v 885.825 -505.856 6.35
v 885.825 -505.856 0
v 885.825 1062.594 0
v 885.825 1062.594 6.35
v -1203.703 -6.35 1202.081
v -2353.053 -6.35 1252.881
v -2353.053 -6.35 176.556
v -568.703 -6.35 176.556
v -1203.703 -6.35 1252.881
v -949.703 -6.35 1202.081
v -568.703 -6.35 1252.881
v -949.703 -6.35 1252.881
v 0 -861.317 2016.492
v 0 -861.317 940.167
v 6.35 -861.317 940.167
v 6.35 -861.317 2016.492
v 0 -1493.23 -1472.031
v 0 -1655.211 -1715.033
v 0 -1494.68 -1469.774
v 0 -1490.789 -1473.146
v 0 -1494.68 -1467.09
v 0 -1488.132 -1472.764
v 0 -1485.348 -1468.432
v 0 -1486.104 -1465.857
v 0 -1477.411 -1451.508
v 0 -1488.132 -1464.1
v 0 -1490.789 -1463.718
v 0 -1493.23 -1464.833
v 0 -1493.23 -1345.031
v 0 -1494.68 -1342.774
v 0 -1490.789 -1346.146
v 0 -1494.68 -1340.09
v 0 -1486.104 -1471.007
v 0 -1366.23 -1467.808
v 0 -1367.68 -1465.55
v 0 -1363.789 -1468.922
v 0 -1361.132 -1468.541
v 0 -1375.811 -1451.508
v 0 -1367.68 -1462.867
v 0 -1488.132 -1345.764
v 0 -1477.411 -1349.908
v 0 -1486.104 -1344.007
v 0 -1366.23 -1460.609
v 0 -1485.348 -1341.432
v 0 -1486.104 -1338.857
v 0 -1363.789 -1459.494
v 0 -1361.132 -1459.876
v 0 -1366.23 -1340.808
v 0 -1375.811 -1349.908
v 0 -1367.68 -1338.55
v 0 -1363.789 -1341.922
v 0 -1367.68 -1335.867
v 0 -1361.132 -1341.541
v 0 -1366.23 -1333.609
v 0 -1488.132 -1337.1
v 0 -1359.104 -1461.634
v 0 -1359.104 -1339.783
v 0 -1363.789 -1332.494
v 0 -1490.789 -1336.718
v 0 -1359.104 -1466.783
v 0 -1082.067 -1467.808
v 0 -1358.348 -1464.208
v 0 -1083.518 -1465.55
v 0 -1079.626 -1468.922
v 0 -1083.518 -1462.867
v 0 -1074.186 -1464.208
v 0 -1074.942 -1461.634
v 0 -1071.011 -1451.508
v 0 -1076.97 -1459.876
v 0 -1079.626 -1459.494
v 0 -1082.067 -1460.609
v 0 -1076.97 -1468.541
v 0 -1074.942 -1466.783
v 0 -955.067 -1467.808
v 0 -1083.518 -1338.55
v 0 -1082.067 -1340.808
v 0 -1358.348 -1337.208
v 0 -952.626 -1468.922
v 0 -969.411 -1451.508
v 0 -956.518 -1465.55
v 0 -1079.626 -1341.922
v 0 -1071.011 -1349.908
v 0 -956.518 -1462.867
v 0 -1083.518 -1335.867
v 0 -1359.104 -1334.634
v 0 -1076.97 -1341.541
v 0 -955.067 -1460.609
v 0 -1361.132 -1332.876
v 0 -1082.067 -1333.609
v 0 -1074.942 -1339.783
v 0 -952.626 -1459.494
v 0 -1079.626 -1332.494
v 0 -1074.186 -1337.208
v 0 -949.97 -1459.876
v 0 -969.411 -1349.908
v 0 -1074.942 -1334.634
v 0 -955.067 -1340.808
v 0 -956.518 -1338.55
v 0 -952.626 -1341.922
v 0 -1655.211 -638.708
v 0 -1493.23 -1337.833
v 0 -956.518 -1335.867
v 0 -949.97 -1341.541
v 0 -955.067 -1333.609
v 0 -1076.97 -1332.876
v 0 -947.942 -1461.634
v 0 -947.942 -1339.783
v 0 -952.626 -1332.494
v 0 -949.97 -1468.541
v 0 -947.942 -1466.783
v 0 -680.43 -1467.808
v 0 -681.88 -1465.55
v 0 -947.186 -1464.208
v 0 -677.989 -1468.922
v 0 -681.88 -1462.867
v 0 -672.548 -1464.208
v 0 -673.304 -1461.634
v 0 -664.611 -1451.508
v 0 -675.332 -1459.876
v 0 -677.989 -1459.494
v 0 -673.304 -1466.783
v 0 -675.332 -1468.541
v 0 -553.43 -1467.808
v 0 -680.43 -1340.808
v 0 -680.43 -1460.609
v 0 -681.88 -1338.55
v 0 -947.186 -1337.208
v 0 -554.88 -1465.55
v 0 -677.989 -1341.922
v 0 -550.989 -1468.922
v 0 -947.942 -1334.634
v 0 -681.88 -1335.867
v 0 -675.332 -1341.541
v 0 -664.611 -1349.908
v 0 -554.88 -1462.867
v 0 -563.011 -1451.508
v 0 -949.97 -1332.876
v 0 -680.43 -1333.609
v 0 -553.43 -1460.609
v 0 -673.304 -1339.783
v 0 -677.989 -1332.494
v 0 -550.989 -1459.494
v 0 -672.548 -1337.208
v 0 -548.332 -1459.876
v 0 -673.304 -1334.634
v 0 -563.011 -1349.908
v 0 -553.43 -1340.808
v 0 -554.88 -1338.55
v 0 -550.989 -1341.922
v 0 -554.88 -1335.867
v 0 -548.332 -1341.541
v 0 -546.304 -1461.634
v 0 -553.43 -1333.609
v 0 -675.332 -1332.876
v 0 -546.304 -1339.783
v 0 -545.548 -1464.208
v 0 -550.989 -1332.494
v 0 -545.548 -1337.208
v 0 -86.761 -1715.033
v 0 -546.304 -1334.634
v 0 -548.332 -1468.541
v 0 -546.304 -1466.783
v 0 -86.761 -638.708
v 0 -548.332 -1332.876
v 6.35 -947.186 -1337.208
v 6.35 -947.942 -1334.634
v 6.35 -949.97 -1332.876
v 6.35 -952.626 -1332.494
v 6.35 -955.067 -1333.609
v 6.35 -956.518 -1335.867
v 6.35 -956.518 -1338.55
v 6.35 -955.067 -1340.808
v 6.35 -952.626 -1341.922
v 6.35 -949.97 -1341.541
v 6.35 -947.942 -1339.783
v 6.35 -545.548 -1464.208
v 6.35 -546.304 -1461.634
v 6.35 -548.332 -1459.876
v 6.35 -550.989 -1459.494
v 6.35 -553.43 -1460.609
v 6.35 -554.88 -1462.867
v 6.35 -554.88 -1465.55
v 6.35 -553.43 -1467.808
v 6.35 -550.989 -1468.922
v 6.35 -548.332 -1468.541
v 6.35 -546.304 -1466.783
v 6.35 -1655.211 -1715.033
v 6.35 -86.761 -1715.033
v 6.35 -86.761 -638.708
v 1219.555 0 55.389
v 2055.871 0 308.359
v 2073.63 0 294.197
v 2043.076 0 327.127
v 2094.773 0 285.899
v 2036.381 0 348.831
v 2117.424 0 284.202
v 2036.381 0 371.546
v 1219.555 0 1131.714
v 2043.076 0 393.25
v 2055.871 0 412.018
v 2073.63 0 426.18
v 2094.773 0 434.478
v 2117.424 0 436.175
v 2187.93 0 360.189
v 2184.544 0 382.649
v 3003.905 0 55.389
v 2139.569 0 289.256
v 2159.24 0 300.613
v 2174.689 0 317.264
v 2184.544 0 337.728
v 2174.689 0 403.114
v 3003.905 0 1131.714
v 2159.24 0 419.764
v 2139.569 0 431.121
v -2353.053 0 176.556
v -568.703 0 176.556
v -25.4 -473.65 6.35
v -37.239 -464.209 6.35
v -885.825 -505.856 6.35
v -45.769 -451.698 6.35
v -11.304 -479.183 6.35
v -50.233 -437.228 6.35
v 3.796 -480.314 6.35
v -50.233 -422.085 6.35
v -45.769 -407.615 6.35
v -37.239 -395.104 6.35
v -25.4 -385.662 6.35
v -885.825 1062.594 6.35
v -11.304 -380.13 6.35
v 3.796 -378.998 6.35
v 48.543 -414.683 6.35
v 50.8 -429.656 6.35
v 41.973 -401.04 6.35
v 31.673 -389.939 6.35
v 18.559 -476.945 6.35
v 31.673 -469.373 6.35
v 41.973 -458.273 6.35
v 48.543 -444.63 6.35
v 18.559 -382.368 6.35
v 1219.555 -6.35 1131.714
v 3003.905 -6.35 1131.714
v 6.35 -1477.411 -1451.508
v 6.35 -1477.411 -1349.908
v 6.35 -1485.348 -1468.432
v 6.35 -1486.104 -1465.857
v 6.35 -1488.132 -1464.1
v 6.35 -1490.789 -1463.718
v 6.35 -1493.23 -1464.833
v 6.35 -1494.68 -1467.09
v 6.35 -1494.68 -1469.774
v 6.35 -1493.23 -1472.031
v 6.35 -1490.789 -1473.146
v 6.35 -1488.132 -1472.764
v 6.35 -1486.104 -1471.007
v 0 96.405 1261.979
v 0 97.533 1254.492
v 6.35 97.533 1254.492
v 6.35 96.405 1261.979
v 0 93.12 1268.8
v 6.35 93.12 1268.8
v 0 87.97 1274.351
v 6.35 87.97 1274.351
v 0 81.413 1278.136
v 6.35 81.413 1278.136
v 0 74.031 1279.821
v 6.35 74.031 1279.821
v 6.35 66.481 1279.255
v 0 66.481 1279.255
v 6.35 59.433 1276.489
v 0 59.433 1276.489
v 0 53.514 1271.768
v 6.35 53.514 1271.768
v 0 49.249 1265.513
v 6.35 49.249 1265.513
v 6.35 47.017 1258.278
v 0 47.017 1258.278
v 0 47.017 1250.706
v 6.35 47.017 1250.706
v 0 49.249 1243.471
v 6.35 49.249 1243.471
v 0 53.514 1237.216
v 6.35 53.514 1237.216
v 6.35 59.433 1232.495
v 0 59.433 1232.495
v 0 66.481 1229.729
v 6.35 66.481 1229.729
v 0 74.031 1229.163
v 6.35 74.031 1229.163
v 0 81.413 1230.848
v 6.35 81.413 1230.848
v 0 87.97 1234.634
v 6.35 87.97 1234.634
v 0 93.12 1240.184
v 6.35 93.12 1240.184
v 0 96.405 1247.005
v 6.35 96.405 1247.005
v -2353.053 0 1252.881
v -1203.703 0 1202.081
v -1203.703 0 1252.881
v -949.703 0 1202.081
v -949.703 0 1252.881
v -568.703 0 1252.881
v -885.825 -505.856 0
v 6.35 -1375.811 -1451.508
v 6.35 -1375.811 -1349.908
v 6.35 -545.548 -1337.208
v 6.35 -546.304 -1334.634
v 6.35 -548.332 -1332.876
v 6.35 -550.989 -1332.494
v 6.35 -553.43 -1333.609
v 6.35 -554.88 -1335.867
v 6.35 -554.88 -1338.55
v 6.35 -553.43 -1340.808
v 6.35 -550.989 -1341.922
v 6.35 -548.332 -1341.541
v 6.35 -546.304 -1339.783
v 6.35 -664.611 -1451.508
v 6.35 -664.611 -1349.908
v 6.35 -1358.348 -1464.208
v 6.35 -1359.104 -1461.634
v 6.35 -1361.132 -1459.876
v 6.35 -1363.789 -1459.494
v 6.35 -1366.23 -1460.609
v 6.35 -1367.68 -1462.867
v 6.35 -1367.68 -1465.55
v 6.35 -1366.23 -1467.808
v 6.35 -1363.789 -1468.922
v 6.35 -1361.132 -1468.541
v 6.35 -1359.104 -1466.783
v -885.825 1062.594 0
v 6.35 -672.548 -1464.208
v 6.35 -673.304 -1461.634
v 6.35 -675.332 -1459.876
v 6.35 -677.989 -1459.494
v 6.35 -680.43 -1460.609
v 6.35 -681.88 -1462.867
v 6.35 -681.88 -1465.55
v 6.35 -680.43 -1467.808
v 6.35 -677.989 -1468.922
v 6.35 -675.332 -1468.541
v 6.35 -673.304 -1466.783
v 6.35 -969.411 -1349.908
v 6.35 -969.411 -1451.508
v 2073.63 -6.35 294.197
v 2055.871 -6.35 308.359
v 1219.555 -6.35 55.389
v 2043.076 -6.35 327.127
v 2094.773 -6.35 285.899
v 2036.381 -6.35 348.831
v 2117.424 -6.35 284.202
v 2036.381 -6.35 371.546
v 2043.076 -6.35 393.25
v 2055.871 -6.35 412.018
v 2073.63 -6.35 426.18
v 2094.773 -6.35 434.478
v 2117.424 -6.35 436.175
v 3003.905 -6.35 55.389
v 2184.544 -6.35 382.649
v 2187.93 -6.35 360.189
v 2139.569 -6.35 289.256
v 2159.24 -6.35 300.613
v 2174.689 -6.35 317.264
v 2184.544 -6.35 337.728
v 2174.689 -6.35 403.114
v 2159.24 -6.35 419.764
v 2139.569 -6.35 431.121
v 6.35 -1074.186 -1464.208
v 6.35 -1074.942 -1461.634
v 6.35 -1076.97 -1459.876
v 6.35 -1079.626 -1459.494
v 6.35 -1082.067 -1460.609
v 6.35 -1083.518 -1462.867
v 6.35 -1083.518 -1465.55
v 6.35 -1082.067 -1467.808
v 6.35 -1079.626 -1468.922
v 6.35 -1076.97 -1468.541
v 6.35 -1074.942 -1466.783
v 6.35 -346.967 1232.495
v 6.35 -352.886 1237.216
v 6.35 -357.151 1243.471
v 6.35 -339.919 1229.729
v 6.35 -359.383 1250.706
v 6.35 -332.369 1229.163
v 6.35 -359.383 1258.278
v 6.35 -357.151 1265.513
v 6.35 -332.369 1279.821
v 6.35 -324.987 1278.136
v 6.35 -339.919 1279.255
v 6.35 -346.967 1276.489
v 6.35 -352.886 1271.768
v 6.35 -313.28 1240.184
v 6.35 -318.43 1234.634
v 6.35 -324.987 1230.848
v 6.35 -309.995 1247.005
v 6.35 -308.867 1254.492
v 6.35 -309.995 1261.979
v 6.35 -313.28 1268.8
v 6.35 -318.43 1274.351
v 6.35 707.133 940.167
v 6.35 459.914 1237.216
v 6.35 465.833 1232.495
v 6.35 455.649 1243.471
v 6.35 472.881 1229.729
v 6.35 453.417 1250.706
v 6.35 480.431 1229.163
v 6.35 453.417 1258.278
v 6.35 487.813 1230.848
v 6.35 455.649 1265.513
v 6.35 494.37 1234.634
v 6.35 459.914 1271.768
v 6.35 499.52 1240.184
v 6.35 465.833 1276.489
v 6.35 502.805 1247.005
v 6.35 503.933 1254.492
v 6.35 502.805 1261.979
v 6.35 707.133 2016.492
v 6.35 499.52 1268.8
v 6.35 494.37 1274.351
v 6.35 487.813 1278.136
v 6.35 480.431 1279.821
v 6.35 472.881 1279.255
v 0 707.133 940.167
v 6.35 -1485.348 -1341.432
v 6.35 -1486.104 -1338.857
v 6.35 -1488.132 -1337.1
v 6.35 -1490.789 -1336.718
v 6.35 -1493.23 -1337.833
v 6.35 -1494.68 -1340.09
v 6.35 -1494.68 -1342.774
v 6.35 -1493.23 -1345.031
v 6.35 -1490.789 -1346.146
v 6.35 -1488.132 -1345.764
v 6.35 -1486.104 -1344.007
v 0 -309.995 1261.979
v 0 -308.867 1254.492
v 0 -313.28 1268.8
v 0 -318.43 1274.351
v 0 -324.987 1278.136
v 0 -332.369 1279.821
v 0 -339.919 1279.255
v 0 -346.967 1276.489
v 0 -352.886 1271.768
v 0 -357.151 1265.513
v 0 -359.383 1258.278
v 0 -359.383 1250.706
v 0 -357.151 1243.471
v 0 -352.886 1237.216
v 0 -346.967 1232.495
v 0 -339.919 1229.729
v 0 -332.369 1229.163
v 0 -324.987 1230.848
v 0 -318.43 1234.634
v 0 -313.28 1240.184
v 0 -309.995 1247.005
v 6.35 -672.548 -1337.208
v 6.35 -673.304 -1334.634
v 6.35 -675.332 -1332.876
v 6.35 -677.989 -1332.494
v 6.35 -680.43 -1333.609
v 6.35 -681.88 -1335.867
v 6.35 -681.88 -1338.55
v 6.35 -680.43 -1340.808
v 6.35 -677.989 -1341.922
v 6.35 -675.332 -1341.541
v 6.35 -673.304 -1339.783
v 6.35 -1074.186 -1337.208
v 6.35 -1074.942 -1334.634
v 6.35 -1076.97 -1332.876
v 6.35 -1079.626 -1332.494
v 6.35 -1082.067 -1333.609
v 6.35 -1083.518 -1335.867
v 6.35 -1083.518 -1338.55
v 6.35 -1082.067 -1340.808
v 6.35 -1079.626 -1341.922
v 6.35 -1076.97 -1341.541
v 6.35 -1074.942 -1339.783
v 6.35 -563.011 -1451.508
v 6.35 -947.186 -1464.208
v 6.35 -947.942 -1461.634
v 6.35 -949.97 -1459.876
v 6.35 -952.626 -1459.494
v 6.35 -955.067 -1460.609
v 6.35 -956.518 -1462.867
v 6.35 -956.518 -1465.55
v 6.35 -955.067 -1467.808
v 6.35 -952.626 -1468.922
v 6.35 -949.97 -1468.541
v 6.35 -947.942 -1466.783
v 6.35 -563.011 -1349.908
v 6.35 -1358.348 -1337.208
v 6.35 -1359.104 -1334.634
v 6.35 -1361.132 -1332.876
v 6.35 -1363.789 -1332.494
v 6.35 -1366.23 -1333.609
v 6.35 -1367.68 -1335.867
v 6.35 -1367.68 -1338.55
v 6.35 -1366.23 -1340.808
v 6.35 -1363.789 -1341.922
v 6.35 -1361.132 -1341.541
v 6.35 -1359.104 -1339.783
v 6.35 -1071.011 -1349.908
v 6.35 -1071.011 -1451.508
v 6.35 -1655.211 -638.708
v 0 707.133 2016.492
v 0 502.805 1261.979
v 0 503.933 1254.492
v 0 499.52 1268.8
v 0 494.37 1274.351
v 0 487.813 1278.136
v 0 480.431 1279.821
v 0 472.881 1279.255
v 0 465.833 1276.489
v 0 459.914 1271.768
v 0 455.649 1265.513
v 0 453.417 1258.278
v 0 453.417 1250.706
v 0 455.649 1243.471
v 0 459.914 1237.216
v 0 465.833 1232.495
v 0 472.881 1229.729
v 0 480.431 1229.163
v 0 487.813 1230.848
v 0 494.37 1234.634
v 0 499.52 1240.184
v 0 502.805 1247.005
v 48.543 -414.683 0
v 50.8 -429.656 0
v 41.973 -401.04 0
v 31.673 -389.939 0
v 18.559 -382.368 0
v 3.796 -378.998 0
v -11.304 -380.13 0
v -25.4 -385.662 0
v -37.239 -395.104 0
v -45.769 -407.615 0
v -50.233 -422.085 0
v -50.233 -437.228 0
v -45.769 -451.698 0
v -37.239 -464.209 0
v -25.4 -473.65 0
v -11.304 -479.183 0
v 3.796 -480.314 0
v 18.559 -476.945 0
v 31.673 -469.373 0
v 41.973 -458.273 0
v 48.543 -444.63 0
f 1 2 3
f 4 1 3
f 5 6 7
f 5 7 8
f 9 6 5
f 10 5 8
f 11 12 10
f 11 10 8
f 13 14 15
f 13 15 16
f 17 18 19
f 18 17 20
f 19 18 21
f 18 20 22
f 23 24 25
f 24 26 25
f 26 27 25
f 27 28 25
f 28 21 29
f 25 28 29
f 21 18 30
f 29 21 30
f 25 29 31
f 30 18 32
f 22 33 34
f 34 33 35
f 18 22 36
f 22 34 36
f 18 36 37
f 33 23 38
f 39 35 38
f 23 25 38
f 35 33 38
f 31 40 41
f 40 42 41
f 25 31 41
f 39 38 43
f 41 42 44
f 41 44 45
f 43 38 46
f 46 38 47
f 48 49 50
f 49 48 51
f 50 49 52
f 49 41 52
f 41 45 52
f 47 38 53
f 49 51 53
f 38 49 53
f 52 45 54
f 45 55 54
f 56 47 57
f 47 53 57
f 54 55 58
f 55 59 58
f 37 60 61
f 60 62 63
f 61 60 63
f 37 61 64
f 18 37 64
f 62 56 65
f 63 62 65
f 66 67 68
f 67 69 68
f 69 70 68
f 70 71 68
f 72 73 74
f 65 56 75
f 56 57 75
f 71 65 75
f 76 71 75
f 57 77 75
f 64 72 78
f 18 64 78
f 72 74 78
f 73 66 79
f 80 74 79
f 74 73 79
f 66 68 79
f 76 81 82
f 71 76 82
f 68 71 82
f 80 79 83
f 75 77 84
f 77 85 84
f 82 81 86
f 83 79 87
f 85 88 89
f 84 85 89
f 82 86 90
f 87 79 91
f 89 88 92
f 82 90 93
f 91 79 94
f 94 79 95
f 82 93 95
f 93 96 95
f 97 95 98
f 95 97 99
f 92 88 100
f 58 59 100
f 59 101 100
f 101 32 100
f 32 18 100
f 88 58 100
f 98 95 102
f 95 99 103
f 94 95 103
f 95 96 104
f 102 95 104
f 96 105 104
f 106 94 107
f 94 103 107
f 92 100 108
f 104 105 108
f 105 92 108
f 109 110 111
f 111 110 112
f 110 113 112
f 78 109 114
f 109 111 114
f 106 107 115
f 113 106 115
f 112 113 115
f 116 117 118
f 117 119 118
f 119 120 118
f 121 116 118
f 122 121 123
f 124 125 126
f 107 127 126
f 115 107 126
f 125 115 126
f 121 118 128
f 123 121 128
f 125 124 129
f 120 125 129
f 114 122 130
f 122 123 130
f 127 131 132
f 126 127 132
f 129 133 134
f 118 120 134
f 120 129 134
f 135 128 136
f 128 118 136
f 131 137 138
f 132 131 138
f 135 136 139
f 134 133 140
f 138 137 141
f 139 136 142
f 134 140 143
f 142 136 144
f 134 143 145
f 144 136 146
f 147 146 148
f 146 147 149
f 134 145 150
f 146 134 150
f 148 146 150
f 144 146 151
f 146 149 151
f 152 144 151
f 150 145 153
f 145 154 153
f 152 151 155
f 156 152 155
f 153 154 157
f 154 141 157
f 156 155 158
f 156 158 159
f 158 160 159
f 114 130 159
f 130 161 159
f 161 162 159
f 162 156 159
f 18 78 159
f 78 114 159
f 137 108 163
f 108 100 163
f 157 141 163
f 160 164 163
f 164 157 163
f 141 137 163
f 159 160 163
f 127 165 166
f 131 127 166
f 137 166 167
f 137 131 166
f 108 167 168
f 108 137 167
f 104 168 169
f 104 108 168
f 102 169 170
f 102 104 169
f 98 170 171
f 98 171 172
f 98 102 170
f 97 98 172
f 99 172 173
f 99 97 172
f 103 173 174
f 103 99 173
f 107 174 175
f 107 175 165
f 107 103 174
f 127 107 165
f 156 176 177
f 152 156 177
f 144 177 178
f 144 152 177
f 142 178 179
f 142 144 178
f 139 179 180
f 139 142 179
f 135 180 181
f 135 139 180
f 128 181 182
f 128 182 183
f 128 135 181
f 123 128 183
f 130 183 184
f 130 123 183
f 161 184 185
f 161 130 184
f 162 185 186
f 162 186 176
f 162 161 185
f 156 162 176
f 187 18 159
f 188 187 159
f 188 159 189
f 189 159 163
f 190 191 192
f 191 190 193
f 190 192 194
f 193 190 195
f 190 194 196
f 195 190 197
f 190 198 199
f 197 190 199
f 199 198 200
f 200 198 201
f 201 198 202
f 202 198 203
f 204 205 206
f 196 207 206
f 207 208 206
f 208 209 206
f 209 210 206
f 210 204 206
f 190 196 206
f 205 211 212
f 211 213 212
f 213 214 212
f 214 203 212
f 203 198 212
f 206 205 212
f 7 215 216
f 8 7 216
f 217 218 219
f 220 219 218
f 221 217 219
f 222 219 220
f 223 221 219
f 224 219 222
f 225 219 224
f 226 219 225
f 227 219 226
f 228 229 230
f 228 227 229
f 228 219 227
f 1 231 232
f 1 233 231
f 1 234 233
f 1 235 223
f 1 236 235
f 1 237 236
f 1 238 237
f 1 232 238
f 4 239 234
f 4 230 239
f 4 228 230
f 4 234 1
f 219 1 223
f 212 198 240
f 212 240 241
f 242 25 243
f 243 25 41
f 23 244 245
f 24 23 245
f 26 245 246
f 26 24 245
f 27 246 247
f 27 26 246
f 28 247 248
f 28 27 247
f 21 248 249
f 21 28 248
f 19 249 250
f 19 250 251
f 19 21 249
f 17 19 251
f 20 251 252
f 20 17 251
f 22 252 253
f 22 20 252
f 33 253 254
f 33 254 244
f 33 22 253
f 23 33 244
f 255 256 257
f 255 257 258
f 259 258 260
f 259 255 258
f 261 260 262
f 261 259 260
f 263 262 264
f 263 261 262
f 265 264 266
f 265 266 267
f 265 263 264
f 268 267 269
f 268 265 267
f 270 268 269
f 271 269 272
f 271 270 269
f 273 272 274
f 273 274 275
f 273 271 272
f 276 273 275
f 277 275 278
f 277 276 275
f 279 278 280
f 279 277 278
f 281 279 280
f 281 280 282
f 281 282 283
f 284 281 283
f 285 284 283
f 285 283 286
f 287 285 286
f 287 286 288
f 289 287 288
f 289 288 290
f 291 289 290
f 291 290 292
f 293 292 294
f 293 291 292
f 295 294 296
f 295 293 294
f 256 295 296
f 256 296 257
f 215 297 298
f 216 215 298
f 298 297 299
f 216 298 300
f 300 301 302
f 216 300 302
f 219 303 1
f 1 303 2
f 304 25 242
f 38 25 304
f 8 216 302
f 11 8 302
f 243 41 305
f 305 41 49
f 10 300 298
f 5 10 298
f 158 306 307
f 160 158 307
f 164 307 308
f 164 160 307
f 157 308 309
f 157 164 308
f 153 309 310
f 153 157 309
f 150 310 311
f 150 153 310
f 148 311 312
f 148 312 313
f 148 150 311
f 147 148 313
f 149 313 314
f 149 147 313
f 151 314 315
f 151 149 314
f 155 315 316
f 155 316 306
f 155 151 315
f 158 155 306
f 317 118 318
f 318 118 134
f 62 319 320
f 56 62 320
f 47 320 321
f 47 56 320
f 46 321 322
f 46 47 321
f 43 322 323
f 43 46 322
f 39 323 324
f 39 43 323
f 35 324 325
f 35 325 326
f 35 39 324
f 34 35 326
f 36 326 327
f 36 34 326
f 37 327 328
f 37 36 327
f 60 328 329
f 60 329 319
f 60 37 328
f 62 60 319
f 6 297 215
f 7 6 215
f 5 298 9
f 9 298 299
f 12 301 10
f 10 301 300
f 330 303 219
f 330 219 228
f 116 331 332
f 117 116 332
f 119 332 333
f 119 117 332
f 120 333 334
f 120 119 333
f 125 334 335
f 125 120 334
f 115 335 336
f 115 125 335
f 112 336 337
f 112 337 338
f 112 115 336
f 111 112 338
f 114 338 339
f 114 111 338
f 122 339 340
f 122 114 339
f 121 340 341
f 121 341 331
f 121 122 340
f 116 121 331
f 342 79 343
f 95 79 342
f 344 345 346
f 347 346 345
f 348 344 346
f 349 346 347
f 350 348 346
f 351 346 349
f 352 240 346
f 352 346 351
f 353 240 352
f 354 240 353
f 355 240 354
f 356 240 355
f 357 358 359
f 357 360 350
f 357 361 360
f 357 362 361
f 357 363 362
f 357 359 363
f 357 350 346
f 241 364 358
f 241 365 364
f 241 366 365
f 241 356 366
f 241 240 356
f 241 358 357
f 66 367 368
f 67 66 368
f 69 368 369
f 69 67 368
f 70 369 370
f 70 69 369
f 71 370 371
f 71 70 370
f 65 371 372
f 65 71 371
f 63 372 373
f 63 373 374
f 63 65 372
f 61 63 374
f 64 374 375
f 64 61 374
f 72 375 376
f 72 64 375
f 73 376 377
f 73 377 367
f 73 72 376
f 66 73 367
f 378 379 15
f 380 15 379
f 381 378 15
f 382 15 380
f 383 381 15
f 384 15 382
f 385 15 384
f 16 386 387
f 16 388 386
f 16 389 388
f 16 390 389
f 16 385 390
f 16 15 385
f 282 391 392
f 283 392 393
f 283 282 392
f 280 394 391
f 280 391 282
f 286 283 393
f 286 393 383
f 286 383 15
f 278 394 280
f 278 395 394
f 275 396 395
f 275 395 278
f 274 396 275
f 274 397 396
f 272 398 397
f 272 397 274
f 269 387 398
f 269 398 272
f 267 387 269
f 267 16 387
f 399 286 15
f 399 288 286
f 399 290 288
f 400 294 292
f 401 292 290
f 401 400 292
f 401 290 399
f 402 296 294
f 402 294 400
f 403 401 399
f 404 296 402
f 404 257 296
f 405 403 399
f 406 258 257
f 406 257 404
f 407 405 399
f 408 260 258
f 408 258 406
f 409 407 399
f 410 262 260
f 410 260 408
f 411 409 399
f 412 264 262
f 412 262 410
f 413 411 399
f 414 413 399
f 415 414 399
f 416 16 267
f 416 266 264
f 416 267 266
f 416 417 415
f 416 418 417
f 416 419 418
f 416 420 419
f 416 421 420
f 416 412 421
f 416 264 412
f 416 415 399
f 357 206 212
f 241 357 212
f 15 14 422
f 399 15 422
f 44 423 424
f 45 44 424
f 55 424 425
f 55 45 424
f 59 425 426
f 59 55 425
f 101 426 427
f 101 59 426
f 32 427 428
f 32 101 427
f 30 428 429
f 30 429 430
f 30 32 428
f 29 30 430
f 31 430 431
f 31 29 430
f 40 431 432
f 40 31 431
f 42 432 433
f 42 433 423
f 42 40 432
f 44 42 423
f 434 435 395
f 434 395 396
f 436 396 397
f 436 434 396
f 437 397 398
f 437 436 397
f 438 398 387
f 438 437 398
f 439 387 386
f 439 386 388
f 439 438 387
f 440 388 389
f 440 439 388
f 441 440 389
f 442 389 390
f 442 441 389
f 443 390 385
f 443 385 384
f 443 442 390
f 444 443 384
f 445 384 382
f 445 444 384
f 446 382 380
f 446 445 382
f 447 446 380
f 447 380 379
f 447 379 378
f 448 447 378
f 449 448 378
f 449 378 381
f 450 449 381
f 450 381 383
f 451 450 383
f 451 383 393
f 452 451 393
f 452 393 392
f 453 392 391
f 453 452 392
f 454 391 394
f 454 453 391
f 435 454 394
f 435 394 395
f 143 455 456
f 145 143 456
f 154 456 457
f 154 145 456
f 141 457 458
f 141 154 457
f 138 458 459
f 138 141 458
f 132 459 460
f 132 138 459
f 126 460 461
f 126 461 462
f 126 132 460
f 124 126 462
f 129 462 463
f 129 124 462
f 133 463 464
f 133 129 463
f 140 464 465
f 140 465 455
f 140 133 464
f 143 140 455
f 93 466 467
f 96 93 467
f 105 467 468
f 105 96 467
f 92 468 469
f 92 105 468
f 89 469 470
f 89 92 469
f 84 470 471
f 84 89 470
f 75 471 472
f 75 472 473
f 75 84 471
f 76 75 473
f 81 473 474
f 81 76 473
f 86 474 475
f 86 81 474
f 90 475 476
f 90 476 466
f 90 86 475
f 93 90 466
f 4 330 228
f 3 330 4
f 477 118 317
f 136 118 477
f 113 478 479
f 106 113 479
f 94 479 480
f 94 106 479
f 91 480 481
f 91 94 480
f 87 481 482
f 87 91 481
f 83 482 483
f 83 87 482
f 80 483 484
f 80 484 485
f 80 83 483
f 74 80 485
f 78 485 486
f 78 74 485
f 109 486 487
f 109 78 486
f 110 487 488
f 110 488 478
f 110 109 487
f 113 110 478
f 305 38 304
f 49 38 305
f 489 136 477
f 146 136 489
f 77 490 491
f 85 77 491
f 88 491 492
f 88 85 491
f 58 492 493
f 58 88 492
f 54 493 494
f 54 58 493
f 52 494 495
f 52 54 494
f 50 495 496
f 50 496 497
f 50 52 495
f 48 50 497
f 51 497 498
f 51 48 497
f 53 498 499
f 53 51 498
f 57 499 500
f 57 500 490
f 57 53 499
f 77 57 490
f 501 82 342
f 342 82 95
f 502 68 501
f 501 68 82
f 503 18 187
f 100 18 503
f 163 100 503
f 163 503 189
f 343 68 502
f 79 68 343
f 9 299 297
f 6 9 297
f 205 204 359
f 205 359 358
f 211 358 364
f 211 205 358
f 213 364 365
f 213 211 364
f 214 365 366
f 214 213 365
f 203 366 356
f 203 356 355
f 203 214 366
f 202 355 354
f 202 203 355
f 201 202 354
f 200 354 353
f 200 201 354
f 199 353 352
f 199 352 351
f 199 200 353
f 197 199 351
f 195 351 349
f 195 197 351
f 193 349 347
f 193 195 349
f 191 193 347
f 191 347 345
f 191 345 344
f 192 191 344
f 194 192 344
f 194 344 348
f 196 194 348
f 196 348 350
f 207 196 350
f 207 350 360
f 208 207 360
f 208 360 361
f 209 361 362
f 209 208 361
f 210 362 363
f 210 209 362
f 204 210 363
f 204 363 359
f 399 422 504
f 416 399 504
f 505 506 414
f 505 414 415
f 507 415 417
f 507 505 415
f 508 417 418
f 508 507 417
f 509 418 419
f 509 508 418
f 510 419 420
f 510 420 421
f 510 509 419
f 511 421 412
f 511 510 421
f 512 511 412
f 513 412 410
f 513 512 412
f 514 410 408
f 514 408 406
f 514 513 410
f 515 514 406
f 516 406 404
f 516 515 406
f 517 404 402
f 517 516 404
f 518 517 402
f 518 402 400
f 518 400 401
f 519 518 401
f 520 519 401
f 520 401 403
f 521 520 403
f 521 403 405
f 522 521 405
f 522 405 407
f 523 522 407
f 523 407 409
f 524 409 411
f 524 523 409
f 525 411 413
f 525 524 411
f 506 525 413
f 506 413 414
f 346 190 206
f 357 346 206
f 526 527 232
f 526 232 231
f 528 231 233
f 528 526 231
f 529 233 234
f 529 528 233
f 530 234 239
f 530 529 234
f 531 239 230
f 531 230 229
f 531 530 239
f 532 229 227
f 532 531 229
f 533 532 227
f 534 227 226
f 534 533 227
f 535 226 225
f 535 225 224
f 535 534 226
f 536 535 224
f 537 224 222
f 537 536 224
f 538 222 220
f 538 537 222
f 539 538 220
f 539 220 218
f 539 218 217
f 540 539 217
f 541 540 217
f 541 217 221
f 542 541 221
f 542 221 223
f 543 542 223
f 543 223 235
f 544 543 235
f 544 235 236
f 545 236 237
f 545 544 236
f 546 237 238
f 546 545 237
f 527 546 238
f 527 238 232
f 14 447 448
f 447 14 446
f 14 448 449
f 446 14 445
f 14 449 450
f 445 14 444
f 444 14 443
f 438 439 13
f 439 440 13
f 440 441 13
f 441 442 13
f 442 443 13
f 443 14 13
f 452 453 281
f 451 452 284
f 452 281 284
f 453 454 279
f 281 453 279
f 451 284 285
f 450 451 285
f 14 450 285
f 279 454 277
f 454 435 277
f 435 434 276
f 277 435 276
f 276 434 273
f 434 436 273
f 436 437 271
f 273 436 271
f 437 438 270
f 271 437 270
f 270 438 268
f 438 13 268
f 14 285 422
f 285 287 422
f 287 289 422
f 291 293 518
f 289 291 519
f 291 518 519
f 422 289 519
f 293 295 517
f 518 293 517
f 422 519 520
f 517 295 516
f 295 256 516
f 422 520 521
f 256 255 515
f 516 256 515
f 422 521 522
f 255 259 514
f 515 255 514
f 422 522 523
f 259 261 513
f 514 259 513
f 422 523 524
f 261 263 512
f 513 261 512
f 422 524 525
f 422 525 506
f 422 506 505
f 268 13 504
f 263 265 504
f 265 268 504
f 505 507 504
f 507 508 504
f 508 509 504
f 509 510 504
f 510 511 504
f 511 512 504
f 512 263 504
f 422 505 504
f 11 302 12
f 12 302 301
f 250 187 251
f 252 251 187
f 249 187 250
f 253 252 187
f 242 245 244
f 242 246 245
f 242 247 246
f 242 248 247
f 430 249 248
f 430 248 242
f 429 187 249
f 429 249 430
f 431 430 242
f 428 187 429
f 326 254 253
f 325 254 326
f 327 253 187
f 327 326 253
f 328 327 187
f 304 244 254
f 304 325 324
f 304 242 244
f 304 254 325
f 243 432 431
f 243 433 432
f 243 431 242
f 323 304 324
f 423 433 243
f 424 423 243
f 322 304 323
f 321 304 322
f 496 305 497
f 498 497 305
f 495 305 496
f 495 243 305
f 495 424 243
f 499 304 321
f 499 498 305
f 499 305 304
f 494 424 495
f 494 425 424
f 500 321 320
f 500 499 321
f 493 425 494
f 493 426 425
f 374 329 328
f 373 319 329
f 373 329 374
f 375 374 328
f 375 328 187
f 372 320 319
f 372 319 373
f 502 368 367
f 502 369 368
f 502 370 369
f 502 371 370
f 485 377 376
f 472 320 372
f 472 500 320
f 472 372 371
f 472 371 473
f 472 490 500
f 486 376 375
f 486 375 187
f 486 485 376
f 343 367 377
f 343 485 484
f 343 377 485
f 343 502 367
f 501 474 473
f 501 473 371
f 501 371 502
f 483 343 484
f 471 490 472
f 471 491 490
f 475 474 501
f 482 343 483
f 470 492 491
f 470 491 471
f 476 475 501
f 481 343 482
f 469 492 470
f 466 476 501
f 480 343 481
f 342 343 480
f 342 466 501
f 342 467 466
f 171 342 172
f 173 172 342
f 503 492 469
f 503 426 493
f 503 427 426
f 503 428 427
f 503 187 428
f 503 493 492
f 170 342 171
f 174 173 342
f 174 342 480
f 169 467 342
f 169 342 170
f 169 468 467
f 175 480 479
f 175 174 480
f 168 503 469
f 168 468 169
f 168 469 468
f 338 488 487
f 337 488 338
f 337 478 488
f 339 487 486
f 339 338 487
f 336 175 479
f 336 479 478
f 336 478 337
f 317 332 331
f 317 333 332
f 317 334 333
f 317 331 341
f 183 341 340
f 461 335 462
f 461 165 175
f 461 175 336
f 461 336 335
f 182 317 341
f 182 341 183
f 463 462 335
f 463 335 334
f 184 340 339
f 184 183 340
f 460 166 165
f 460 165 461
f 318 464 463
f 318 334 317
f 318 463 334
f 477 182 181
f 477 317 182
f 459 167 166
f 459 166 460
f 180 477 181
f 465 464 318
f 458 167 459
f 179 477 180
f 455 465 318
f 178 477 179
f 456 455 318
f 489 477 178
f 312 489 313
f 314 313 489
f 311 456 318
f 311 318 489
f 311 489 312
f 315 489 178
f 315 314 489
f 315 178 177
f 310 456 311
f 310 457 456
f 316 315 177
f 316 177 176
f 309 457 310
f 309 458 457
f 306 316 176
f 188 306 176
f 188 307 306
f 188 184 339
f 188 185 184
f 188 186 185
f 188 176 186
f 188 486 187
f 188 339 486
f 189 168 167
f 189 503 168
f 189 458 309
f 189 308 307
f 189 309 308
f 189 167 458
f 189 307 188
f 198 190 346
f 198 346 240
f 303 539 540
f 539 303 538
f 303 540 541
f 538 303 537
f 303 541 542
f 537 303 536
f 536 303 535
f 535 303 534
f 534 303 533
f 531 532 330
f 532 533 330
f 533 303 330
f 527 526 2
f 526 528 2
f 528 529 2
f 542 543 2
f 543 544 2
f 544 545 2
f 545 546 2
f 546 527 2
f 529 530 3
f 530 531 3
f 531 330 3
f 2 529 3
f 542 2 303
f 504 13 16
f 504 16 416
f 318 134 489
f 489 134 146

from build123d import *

# Parameters (mm, degrees)
F5_DEPTH = 6.35
F4_W     = 1784.35
F4_H     = 1076.325
F4_R     = 76.2
F6_DEPTH = 6.35
F1_W     = 1568.45
F1_H     = 1076.325
F1_R     = 25.4
F7_DEPTH = 6.35
F0_W     = 1771.65
F0_H     = 1568.45
F0_R     = 50.8
F8_DEPTH = 6.35
F2_W     = 1568.45
F2_H     = 1076.325
F2_R     = 4.7625
F2_W_2   = 101.6
F2_H_2   = 101.6
F9_DEPTH = 6.35


with BuildPart() as f5:
    # F3 (on Front) → F5 (new body)
    with BuildSketch(Plane.XZ):
        Polygon((-2353.053082, 1252.881341), (-2353.053082, 176.556341), (-568.703082, 176.556341), (-568.703082, 1252.881341), (-949.703082, 1252.881341), (-949.703082, 1202.081341), (-1203.703082, 1202.081341), (-1203.703082, 1252.881341), align=None)
    extrude(amount=F5_DEPTH)


with BuildPart() as f6:
    # F4 (on Front) → F6 (new body)
    with BuildSketch(Plane.XZ):
        with Locations((2111.729585, 593.551013)):
            Rectangle(F4_W, F4_H)
        with Locations((2111.729585, 360.188513)):
            Circle(F4_R, mode=Mode.SUBTRACT)
    extrude(amount=F6_DEPTH)


with BuildPart() as f7:
    # F1 (on Right) → F7 (new body)
    with BuildSketch(Plane.YZ):
        with Locations((-77.091645, 1478.329556)):
            Rectangle(F1_W, F1_H)
        with Locations((-334.266645, 1254.492056)):
            Circle(F1_R, mode=Mode.SUBTRACT)
        with Locations((72.133355, 1254.492056)):
            Circle(F1_R, mode=Mode.SUBTRACT)
        with Locations((478.533355, 1254.492056)):
            Circle(F1_R, mode=Mode.SUBTRACT)
    extrude(amount=F7_DEPTH)


with BuildPart() as f8:
    # F0 (on Top) → F8 (new body)
    with BuildSketch(Plane.XY):
        with Locations((0, 278.368673)):
            Rectangle(F0_W, F0_H)
        with Locations((0, -429.656327)):
            Circle(F0_R, mode=Mode.SUBTRACT)
    extrude(amount=F8_DEPTH)


with BuildPart() as f9:
    # F2 (on Right) → F9 (new body)
    with BuildSketch(Plane.YZ):
        with Locations((-870.985828, -1176.870885)):
            Rectangle(F2_W, F2_H)
        with Locations((-1490.110828, -1468.432214)):
            Circle(F2_R, mode=Mode.SUBTRACT)
        with Locations((-1363.110828, -1464.208385)):
            Circle(F2_R, mode=Mode.SUBTRACT)
        with Locations((-1078.948328, -1464.208385)):
            Circle(F2_R, mode=Mode.SUBTRACT)
        with Locations((-951.948328, -1464.208385)):
            Circle(F2_R, mode=Mode.SUBTRACT)
        with Locations((-1490.110828, -1341.432214)):
            Circle(F2_R, mode=Mode.SUBTRACT)
        with Locations((-1426.610828, -1400.708385)):
            Rectangle(F2_W_2, F2_H_2, mode=Mode.SUBTRACT)
        with Locations((-1363.110828, -1337.208385)):
            Circle(F2_R, mode=Mode.SUBTRACT)
        with Locations((-1078.948328, -1337.208385)):
            Circle(F2_R, mode=Mode.SUBTRACT)
        with Locations((-1020.210828, -1400.708385)):
            Rectangle(F2_W_2, F2_H_2, mode=Mode.SUBTRACT)
        with Locations((-951.948328, -1337.208385)):
            Circle(F2_R, mode=Mode.SUBTRACT)
        with Locations((-677.310828, -1464.208385)):
            Circle(F2_R, mode=Mode.SUBTRACT)
        with Locations((-550.310828, -1464.208385)):
            Circle(F2_R, mode=Mode.SUBTRACT)
        with Locations((-677.310828, -1337.208385)):
            Circle(F2_R, mode=Mode.SUBTRACT)
        with Locations((-613.810828, -1400.708385)):
            Rectangle(F2_W_2, F2_H_2, mode=Mode.SUBTRACT)
        with Locations((-550.310828, -1337.208385)):
            Circle(F2_R, mode=Mode.SUBTRACT)
    extrude(amount=F9_DEPTH)


solid = Compound([f5.part, f6.part, f7.part, f8.part, f9.part])
